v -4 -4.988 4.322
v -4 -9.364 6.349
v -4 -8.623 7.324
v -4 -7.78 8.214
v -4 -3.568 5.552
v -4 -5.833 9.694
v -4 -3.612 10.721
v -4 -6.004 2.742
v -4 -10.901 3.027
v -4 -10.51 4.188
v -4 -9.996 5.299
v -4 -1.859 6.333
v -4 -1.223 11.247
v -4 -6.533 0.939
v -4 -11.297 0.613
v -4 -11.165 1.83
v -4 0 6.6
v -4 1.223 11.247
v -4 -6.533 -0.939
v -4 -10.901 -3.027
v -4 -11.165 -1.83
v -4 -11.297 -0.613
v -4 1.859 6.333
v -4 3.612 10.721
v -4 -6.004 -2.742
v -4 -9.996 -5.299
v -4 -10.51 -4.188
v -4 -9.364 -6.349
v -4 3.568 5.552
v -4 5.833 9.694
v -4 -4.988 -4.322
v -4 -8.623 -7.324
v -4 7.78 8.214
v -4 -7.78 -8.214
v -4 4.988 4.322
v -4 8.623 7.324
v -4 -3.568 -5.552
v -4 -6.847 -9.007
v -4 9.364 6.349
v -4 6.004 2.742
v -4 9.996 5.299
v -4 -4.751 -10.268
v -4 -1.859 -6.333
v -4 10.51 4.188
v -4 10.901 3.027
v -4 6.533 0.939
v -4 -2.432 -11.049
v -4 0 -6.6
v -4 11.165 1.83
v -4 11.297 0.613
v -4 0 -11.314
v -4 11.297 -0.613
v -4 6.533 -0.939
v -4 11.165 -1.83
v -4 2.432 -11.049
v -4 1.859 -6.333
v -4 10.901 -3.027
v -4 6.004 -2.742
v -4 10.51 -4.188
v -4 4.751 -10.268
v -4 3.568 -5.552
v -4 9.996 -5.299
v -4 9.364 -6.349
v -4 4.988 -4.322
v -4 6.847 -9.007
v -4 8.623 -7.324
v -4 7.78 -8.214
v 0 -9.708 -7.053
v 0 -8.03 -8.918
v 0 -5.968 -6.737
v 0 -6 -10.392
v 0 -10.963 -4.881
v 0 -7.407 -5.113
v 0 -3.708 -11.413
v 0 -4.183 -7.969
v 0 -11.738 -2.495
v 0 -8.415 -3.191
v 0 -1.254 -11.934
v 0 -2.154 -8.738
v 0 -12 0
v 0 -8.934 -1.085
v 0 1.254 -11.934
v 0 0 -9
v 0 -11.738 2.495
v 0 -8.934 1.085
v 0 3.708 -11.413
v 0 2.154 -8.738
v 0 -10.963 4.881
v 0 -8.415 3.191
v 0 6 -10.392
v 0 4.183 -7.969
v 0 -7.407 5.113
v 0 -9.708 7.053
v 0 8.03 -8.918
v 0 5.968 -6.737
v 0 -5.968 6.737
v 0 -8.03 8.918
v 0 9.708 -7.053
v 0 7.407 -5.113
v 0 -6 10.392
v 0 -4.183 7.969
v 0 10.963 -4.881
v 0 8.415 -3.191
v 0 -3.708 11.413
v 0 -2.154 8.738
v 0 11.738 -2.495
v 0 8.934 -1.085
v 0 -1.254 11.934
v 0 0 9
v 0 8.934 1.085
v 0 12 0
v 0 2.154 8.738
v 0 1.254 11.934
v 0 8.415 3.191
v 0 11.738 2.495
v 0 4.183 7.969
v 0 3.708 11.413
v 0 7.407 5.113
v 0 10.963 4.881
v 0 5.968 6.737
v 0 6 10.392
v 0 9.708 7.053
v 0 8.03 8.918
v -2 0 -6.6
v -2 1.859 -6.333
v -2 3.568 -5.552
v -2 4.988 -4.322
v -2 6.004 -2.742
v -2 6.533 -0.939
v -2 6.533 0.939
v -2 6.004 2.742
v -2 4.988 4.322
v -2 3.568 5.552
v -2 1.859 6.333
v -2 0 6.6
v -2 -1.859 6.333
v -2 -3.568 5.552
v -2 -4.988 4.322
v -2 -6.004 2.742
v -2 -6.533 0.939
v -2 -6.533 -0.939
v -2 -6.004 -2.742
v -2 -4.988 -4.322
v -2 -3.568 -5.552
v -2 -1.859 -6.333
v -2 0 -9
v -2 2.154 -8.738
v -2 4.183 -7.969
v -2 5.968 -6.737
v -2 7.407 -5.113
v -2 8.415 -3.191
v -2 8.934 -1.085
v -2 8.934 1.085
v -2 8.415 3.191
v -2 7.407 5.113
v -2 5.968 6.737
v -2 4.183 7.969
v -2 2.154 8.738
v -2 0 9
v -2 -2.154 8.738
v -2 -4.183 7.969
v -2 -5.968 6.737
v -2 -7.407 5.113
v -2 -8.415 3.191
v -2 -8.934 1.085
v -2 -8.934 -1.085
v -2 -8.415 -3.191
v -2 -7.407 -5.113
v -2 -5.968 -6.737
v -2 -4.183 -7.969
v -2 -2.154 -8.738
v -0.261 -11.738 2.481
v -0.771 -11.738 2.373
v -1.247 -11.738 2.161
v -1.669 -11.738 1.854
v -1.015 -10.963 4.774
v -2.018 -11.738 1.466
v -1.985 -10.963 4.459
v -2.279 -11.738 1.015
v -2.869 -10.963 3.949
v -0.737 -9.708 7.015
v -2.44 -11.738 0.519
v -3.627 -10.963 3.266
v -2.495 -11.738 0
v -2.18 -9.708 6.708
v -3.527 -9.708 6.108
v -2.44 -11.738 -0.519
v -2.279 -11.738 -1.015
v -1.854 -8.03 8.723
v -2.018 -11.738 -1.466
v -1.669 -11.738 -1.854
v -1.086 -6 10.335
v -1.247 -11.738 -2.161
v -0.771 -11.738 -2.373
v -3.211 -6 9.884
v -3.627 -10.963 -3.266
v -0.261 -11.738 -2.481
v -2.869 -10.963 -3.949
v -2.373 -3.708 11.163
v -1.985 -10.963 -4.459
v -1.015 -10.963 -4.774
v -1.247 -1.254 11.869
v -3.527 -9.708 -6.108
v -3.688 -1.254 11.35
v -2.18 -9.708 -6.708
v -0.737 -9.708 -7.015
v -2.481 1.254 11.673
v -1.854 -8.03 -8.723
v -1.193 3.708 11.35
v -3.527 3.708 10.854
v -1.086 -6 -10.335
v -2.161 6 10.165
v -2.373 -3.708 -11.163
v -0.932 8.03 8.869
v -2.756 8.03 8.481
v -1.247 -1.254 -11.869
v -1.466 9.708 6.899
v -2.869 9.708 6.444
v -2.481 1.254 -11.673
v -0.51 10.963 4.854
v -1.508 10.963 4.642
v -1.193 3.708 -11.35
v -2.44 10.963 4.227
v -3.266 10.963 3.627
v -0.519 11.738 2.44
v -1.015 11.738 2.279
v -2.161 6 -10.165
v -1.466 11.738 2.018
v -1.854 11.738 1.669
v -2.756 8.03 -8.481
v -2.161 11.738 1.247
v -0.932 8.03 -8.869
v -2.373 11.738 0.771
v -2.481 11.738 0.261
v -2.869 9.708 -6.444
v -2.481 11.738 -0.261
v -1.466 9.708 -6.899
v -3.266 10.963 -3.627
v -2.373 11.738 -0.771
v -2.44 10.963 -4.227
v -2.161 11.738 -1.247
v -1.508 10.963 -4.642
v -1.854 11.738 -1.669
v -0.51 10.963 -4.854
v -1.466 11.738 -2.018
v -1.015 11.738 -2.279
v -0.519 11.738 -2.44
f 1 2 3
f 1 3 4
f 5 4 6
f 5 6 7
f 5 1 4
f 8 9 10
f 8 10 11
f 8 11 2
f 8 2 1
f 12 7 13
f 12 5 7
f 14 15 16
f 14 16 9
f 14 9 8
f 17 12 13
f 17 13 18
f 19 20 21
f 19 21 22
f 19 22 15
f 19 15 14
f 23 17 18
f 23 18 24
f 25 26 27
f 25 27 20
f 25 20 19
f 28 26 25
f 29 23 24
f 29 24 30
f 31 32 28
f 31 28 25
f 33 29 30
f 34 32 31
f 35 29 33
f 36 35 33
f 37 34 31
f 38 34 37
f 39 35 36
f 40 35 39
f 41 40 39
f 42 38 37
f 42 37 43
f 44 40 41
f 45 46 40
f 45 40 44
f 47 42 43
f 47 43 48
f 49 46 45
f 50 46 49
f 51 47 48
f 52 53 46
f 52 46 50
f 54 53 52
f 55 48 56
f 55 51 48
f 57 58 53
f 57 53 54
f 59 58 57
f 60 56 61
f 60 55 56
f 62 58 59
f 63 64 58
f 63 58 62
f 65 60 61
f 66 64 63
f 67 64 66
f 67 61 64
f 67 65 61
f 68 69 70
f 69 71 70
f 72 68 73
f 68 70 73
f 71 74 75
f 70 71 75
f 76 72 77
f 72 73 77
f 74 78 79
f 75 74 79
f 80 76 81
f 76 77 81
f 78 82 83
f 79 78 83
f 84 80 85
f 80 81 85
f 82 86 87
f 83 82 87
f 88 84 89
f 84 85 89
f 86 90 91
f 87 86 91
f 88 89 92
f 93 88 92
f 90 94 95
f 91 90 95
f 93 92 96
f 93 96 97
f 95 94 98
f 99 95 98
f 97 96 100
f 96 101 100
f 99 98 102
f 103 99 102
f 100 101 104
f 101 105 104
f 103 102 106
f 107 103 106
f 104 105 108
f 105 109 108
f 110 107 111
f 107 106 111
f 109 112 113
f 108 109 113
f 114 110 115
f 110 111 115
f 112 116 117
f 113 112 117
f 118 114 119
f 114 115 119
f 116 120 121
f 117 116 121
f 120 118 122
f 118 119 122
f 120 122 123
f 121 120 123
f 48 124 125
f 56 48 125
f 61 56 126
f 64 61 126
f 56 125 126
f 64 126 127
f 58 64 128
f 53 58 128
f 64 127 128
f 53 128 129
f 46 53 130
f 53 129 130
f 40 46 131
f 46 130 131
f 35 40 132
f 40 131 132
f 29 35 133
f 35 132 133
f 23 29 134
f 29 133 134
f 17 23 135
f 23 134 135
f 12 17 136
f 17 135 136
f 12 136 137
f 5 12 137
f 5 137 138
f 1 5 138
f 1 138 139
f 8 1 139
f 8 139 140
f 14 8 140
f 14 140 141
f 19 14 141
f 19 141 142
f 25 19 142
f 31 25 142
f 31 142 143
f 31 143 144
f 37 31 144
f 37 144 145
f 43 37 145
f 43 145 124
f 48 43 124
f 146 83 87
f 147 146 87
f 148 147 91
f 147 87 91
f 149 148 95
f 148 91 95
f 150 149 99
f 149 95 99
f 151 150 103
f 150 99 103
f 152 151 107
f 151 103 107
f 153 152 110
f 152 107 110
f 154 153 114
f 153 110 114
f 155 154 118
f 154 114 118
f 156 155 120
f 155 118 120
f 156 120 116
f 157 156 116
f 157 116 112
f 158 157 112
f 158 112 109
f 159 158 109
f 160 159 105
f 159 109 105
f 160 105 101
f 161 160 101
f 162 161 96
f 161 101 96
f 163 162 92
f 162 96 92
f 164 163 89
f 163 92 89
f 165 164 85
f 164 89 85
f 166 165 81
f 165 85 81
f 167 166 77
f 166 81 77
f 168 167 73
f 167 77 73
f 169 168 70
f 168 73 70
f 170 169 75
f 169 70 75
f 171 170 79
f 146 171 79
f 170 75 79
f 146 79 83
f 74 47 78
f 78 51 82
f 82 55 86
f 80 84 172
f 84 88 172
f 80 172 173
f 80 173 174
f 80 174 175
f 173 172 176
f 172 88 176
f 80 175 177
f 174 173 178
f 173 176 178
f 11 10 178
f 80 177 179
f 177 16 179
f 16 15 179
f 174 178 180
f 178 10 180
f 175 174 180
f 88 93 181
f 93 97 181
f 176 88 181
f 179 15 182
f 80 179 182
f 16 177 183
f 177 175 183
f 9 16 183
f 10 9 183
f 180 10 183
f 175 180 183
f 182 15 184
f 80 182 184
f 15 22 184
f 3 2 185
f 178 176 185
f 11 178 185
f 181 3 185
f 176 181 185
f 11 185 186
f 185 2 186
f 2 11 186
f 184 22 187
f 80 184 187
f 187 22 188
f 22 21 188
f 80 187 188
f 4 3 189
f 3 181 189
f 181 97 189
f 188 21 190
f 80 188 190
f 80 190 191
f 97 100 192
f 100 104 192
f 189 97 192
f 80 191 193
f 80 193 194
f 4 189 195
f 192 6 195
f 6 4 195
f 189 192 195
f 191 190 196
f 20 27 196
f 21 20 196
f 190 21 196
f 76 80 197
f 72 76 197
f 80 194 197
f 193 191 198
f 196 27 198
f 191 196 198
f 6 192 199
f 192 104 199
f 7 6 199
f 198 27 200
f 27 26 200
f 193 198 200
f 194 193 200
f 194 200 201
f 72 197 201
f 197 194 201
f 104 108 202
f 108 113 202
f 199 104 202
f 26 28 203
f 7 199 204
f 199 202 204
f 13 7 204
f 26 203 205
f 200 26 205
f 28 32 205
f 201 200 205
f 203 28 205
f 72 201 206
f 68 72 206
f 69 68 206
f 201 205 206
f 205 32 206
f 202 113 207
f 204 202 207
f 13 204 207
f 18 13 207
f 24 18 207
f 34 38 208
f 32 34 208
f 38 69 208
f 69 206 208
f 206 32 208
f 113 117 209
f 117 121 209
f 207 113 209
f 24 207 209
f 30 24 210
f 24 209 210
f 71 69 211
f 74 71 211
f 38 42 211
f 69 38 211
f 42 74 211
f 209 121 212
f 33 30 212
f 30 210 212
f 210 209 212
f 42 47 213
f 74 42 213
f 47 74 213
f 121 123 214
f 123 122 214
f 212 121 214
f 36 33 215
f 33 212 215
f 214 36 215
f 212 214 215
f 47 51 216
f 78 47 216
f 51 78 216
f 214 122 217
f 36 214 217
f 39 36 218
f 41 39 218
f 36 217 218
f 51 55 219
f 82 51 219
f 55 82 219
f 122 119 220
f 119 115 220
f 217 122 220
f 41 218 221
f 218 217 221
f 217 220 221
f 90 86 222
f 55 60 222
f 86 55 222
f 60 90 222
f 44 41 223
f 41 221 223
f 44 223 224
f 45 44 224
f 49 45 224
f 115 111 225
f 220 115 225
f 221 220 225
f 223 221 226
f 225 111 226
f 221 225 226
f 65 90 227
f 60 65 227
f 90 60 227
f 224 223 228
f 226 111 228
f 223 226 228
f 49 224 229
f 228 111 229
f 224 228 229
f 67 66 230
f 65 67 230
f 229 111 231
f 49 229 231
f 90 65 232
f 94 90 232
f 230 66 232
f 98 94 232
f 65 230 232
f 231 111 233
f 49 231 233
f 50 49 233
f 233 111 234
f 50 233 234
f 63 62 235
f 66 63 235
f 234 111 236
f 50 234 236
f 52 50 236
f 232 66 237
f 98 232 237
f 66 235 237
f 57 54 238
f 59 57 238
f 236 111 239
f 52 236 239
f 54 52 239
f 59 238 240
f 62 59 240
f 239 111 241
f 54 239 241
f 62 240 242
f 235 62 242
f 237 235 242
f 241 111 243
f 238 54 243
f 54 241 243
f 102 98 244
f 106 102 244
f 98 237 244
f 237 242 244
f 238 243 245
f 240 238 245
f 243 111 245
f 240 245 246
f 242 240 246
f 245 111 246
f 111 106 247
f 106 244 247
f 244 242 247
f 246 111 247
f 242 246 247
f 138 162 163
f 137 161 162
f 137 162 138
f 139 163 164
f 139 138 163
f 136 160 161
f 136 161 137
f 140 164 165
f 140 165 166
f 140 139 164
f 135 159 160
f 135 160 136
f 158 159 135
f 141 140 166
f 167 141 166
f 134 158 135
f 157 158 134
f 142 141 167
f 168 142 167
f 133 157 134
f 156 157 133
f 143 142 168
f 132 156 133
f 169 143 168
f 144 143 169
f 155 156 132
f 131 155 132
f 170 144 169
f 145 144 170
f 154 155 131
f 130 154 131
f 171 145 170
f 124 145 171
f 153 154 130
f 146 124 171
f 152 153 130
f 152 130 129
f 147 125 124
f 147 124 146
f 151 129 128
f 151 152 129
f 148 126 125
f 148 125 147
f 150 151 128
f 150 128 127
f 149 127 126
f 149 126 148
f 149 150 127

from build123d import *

# Parameters (mm, degrees)
REVOLVE_1_ANGLE          = 180
CUT_EXTRUDE_3_DEPTH      = 21.784609691
CUT_EXTRUDE_3_DEPTH_BACK = 21.784609691
SKETCH_5_W               = 8
SKETCH_5_H               = 30
SKETCH_11_R              = 6.6
CUT_EXTRUDE_7_DEPTH      = 18.435595774
SKETCH_12_R              = 9
CUT_EXTRUDE_8_DEPTH      = 2


with BuildPart() as part:
    # 草图1 → 旋转1 (revolve)
    with BuildSketch(Plane(origin=(0, 0, 0), x_dir=(0, 0, -1), z_dir=(1, 0, 0))):
        with BuildLine():
            Line((0, 12), (0, -12))
            ThreePointArc((0, -12), (-12, 0), (0, 12))
        make_face()
    revolve(axis=Axis((0, 12, 0), (0, -1, 0)), revolution_arc=REVOLVE_1_ANGLE)

    # 草图5 → 切除-拉伸3 (cut, two sides: drawn at the far end of the back side and taken through both)
    with BuildSketch(Plane.XY.offset(-CUT_EXTRUDE_3_DEPTH_BACK)):
        with Locations((-8, 0.775192037)):
            Rectangle(SKETCH_5_W, SKETCH_5_H)
    extrude(amount=CUT_EXTRUDE_3_DEPTH + CUT_EXTRUDE_3_DEPTH_BACK, mode=Mode.SUBTRACT)


with BuildPart() as cut_extrude_3_kept_piece:
    # of the separate pieces the step leaves, the one the design keeps (cut_extrude_3_pieces_kept)
    add(part.part.solids().sort_by_distance((0, -12, 0))[0])

    # 草图11 → 切除-拉伸7 (cut, through all)
    with BuildSketch(Plane(origin=(0, 0, 0), x_dir=(0, 0, -1), z_dir=(1, 0, 0))):
        Circle(SKETCH_11_R)
    extrude(amount=-CUT_EXTRUDE_7_DEPTH, mode=Mode.SUBTRACT)

    # 草图12 → 切除-拉伸8 (cut)
    with BuildSketch(Plane(origin=(0, 0, 0), x_dir=(0, 0, -1), z_dir=(1, 0, 0))):
        Circle(SKETCH_12_R)
    extrude(amount=-CUT_EXTRUDE_8_DEPTH, mode=Mode.SUBTRACT)


solid = cut_extrude_3_kept_piece.part
